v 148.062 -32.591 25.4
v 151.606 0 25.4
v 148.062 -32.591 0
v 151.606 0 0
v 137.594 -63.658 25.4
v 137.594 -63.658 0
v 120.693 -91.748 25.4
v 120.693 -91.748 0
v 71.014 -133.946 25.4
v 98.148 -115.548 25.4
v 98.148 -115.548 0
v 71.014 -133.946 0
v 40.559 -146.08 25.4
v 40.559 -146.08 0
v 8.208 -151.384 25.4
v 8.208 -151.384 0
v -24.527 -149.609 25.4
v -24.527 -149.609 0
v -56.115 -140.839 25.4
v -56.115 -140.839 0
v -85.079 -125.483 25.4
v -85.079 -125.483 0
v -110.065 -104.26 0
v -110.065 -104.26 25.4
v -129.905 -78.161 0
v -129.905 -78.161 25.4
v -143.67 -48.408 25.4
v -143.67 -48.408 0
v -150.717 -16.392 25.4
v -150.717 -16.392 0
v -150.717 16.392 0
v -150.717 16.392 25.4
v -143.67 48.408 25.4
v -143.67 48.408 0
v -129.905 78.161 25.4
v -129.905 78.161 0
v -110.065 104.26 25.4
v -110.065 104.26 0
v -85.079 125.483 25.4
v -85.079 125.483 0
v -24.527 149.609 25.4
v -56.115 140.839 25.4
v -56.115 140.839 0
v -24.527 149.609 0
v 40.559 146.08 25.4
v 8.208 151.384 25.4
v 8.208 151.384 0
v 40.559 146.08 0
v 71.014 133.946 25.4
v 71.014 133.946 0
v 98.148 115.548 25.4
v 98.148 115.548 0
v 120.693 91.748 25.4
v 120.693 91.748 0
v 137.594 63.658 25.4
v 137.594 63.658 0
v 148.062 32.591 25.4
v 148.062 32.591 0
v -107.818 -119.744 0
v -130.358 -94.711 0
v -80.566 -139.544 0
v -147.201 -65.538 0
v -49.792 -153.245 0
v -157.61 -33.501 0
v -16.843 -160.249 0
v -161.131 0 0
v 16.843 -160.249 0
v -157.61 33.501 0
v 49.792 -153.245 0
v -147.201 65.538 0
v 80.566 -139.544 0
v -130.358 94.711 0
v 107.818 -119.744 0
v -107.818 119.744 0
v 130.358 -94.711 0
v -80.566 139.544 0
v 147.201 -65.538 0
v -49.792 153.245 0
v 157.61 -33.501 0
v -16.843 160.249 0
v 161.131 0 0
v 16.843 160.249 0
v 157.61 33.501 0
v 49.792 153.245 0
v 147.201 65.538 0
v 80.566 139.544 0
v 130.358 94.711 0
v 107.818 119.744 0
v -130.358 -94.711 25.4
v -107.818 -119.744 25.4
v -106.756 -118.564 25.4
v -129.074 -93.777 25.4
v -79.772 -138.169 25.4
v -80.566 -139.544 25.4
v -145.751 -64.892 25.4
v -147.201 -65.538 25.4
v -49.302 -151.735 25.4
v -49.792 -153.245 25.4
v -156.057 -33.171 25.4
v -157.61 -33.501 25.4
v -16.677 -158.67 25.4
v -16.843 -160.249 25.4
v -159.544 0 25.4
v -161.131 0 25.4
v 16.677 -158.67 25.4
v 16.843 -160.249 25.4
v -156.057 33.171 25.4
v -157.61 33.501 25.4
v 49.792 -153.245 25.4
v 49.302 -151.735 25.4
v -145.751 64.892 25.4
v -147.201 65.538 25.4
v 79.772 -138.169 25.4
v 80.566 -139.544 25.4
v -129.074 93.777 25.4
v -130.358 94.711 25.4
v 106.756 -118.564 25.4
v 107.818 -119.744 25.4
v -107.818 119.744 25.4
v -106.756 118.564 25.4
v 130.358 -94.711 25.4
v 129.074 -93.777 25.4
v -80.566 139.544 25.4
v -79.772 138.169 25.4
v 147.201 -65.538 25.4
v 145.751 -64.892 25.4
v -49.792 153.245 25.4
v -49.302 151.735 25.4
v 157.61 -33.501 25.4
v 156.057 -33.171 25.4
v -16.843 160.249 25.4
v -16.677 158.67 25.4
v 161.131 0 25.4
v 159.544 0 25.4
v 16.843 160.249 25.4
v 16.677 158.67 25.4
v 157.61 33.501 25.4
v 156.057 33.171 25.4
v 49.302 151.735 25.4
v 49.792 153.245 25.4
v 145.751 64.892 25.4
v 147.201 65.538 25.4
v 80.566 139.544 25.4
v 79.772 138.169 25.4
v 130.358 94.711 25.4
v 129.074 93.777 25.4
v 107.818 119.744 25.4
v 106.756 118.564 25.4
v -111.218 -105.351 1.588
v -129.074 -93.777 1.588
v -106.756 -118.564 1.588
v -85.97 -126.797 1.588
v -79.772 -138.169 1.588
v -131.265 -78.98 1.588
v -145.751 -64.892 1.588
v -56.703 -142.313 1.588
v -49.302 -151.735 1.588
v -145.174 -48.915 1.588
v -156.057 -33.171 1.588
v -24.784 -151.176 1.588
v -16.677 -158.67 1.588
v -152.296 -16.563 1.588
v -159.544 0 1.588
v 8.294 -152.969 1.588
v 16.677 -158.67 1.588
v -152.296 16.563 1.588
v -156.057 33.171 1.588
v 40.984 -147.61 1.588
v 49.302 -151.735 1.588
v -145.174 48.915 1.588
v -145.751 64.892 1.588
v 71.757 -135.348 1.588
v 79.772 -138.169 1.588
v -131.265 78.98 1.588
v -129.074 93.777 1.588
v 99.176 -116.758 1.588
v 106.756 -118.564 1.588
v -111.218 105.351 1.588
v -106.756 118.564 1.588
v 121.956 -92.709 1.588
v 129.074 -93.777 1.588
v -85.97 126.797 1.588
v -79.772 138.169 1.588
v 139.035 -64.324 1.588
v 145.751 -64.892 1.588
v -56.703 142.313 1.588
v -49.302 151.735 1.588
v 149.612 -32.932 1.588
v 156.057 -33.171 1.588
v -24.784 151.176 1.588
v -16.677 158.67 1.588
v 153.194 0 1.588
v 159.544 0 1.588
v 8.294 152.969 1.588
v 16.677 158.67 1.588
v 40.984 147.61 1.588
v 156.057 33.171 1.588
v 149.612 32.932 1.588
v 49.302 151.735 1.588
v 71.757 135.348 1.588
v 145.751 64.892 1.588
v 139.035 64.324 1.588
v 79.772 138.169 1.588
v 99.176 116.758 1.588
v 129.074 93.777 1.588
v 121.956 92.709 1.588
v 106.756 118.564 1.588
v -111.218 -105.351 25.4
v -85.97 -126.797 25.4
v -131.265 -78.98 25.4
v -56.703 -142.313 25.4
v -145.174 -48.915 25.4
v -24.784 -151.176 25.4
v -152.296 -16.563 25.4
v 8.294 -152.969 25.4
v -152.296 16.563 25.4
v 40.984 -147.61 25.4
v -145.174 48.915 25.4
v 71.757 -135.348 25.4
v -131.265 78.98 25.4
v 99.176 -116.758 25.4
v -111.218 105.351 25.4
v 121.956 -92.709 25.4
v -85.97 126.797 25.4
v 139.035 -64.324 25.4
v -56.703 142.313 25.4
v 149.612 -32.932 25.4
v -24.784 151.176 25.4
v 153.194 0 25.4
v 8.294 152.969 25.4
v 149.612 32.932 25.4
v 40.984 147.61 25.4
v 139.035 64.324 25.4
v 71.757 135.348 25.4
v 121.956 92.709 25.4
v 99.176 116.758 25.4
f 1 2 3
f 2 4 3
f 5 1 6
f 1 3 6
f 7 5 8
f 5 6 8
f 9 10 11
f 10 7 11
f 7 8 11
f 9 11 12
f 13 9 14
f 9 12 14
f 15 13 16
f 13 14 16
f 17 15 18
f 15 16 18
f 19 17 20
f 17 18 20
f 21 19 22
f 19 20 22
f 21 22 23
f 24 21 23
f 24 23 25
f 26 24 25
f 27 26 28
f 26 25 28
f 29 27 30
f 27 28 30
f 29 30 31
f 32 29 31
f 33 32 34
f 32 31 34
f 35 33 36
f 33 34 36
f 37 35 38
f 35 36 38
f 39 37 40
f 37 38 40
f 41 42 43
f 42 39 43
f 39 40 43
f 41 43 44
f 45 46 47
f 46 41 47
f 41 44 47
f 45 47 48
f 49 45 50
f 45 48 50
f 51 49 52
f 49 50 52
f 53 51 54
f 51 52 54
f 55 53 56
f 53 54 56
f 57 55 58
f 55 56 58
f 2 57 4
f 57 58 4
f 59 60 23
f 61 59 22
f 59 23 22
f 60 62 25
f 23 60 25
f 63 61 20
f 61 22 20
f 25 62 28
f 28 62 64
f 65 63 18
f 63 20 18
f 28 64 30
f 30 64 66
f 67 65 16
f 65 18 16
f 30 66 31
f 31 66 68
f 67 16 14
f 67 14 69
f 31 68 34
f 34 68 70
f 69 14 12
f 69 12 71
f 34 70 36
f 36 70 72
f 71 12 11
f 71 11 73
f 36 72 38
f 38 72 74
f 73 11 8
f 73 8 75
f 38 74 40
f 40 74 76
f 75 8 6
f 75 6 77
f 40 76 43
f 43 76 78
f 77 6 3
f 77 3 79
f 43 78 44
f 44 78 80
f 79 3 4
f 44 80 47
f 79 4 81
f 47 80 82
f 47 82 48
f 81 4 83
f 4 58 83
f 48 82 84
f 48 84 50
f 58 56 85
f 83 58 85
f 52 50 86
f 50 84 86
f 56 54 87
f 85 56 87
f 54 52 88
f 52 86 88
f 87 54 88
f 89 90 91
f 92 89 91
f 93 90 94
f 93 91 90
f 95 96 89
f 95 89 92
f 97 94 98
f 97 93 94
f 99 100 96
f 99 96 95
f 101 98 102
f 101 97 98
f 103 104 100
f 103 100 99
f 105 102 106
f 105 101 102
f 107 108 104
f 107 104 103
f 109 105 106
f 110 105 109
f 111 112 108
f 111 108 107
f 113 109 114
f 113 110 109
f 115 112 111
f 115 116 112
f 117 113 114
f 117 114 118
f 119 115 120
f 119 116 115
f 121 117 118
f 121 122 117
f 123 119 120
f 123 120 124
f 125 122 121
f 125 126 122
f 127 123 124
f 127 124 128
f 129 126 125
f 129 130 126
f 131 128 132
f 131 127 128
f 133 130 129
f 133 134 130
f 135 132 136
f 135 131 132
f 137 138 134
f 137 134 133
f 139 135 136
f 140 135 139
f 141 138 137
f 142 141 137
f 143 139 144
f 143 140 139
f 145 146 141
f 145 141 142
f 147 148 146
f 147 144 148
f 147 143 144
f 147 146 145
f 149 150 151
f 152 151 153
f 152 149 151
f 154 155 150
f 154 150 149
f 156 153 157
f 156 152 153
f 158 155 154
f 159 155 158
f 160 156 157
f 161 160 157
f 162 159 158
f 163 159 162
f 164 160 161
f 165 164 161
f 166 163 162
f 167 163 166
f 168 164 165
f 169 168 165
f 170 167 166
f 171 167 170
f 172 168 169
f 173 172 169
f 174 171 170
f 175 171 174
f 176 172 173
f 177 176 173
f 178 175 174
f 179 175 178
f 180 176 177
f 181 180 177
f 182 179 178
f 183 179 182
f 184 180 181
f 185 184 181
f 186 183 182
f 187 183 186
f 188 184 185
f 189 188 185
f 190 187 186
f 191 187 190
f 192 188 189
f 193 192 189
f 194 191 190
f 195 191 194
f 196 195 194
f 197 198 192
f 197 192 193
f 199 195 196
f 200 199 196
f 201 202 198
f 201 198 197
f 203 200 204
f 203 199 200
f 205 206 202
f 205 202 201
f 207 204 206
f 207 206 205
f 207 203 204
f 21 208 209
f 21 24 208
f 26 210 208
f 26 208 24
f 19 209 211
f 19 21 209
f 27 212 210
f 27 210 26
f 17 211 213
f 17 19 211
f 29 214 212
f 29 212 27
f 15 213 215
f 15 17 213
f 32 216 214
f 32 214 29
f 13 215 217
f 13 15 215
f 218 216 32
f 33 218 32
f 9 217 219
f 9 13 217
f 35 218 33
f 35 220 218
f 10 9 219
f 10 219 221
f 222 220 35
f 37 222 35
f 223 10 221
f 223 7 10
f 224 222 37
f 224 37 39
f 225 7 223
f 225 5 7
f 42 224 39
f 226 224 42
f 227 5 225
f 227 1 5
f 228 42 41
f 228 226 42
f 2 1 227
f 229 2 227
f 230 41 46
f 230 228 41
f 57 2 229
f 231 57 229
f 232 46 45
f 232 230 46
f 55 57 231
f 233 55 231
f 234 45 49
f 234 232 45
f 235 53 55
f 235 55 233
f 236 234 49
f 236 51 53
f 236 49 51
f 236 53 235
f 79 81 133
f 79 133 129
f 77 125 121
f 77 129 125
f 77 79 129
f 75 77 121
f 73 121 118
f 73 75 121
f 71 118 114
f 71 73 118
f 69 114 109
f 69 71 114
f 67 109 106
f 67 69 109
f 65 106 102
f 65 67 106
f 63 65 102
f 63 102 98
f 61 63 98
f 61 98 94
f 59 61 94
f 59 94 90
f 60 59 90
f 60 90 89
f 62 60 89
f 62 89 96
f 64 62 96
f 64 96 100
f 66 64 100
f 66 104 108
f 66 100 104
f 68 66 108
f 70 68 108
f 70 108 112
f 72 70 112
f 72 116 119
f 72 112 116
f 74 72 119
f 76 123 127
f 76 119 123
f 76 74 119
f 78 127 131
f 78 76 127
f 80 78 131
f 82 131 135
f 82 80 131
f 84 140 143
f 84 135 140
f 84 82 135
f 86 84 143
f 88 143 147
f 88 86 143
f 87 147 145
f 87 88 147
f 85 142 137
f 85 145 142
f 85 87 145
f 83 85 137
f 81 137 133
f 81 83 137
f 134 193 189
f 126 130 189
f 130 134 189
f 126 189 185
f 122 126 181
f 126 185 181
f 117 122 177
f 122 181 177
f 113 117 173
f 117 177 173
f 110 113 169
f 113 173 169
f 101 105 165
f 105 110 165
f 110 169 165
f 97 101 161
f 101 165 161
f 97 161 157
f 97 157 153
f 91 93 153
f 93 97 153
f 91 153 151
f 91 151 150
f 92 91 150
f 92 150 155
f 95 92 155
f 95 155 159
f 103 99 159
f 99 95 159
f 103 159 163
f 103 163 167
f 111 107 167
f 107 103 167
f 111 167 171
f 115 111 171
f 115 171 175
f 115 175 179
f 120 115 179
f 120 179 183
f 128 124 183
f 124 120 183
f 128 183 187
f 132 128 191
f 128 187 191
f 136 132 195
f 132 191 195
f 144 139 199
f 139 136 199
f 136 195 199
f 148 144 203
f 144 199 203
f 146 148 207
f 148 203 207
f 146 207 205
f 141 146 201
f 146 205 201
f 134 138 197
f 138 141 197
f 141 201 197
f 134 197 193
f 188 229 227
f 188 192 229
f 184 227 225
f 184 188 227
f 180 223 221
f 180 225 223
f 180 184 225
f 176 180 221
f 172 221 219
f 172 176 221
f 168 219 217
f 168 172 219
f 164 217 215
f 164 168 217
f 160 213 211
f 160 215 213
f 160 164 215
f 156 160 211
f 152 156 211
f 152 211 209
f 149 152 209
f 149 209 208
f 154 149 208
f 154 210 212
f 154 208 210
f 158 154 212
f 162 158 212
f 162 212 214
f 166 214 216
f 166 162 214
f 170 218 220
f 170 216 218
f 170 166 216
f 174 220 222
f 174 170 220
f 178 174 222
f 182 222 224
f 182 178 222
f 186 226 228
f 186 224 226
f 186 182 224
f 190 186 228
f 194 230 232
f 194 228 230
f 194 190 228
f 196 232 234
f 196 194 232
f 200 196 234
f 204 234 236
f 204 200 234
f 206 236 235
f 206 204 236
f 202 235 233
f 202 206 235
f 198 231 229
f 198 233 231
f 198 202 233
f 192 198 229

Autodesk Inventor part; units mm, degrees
ref_plane "YZ Plane" through (0, 0, 0) normal (1, 0, 0) x (0, 1, 0)
ref_plane "XZ Plane" through (0, 0, 0) normal (0, 1, 0) x (-1, 0, 0)
ref_plane "XY Plane" through (0, 0, 0) normal (0, 0, 1) x (1, 0, 0)
sketch "Sketch1" plane through (0, 0, 0) normal (0, 0, 1) x (1, 0, 0)
  circle A0 centre (0, 0) radius 161.1312
  circle A1 centre (0, 0) radius 151.6062
  circle A2 centre (0, 0) radius 153.1937
  circle A3 centre (0, 0) radius 159.5438
  dimension "d2" = 9.525
  dimension "d3" = 303.2125
  dimension "d4" = 322.2625
  dimension "d13" = 306.3875
  dimension "d14" = 319.0875
  dimension "d15" = 6.35
  dimension "d16" = 1.5875
  dimension "d21" = 0
extrude "Extrusion1" add sketch "Sketch1" along normal blind 1.5875 contours A3
extrude "Extrusion2" add sketch "Sketch1" along normal blind 25.4
properties part number "tubecap"
